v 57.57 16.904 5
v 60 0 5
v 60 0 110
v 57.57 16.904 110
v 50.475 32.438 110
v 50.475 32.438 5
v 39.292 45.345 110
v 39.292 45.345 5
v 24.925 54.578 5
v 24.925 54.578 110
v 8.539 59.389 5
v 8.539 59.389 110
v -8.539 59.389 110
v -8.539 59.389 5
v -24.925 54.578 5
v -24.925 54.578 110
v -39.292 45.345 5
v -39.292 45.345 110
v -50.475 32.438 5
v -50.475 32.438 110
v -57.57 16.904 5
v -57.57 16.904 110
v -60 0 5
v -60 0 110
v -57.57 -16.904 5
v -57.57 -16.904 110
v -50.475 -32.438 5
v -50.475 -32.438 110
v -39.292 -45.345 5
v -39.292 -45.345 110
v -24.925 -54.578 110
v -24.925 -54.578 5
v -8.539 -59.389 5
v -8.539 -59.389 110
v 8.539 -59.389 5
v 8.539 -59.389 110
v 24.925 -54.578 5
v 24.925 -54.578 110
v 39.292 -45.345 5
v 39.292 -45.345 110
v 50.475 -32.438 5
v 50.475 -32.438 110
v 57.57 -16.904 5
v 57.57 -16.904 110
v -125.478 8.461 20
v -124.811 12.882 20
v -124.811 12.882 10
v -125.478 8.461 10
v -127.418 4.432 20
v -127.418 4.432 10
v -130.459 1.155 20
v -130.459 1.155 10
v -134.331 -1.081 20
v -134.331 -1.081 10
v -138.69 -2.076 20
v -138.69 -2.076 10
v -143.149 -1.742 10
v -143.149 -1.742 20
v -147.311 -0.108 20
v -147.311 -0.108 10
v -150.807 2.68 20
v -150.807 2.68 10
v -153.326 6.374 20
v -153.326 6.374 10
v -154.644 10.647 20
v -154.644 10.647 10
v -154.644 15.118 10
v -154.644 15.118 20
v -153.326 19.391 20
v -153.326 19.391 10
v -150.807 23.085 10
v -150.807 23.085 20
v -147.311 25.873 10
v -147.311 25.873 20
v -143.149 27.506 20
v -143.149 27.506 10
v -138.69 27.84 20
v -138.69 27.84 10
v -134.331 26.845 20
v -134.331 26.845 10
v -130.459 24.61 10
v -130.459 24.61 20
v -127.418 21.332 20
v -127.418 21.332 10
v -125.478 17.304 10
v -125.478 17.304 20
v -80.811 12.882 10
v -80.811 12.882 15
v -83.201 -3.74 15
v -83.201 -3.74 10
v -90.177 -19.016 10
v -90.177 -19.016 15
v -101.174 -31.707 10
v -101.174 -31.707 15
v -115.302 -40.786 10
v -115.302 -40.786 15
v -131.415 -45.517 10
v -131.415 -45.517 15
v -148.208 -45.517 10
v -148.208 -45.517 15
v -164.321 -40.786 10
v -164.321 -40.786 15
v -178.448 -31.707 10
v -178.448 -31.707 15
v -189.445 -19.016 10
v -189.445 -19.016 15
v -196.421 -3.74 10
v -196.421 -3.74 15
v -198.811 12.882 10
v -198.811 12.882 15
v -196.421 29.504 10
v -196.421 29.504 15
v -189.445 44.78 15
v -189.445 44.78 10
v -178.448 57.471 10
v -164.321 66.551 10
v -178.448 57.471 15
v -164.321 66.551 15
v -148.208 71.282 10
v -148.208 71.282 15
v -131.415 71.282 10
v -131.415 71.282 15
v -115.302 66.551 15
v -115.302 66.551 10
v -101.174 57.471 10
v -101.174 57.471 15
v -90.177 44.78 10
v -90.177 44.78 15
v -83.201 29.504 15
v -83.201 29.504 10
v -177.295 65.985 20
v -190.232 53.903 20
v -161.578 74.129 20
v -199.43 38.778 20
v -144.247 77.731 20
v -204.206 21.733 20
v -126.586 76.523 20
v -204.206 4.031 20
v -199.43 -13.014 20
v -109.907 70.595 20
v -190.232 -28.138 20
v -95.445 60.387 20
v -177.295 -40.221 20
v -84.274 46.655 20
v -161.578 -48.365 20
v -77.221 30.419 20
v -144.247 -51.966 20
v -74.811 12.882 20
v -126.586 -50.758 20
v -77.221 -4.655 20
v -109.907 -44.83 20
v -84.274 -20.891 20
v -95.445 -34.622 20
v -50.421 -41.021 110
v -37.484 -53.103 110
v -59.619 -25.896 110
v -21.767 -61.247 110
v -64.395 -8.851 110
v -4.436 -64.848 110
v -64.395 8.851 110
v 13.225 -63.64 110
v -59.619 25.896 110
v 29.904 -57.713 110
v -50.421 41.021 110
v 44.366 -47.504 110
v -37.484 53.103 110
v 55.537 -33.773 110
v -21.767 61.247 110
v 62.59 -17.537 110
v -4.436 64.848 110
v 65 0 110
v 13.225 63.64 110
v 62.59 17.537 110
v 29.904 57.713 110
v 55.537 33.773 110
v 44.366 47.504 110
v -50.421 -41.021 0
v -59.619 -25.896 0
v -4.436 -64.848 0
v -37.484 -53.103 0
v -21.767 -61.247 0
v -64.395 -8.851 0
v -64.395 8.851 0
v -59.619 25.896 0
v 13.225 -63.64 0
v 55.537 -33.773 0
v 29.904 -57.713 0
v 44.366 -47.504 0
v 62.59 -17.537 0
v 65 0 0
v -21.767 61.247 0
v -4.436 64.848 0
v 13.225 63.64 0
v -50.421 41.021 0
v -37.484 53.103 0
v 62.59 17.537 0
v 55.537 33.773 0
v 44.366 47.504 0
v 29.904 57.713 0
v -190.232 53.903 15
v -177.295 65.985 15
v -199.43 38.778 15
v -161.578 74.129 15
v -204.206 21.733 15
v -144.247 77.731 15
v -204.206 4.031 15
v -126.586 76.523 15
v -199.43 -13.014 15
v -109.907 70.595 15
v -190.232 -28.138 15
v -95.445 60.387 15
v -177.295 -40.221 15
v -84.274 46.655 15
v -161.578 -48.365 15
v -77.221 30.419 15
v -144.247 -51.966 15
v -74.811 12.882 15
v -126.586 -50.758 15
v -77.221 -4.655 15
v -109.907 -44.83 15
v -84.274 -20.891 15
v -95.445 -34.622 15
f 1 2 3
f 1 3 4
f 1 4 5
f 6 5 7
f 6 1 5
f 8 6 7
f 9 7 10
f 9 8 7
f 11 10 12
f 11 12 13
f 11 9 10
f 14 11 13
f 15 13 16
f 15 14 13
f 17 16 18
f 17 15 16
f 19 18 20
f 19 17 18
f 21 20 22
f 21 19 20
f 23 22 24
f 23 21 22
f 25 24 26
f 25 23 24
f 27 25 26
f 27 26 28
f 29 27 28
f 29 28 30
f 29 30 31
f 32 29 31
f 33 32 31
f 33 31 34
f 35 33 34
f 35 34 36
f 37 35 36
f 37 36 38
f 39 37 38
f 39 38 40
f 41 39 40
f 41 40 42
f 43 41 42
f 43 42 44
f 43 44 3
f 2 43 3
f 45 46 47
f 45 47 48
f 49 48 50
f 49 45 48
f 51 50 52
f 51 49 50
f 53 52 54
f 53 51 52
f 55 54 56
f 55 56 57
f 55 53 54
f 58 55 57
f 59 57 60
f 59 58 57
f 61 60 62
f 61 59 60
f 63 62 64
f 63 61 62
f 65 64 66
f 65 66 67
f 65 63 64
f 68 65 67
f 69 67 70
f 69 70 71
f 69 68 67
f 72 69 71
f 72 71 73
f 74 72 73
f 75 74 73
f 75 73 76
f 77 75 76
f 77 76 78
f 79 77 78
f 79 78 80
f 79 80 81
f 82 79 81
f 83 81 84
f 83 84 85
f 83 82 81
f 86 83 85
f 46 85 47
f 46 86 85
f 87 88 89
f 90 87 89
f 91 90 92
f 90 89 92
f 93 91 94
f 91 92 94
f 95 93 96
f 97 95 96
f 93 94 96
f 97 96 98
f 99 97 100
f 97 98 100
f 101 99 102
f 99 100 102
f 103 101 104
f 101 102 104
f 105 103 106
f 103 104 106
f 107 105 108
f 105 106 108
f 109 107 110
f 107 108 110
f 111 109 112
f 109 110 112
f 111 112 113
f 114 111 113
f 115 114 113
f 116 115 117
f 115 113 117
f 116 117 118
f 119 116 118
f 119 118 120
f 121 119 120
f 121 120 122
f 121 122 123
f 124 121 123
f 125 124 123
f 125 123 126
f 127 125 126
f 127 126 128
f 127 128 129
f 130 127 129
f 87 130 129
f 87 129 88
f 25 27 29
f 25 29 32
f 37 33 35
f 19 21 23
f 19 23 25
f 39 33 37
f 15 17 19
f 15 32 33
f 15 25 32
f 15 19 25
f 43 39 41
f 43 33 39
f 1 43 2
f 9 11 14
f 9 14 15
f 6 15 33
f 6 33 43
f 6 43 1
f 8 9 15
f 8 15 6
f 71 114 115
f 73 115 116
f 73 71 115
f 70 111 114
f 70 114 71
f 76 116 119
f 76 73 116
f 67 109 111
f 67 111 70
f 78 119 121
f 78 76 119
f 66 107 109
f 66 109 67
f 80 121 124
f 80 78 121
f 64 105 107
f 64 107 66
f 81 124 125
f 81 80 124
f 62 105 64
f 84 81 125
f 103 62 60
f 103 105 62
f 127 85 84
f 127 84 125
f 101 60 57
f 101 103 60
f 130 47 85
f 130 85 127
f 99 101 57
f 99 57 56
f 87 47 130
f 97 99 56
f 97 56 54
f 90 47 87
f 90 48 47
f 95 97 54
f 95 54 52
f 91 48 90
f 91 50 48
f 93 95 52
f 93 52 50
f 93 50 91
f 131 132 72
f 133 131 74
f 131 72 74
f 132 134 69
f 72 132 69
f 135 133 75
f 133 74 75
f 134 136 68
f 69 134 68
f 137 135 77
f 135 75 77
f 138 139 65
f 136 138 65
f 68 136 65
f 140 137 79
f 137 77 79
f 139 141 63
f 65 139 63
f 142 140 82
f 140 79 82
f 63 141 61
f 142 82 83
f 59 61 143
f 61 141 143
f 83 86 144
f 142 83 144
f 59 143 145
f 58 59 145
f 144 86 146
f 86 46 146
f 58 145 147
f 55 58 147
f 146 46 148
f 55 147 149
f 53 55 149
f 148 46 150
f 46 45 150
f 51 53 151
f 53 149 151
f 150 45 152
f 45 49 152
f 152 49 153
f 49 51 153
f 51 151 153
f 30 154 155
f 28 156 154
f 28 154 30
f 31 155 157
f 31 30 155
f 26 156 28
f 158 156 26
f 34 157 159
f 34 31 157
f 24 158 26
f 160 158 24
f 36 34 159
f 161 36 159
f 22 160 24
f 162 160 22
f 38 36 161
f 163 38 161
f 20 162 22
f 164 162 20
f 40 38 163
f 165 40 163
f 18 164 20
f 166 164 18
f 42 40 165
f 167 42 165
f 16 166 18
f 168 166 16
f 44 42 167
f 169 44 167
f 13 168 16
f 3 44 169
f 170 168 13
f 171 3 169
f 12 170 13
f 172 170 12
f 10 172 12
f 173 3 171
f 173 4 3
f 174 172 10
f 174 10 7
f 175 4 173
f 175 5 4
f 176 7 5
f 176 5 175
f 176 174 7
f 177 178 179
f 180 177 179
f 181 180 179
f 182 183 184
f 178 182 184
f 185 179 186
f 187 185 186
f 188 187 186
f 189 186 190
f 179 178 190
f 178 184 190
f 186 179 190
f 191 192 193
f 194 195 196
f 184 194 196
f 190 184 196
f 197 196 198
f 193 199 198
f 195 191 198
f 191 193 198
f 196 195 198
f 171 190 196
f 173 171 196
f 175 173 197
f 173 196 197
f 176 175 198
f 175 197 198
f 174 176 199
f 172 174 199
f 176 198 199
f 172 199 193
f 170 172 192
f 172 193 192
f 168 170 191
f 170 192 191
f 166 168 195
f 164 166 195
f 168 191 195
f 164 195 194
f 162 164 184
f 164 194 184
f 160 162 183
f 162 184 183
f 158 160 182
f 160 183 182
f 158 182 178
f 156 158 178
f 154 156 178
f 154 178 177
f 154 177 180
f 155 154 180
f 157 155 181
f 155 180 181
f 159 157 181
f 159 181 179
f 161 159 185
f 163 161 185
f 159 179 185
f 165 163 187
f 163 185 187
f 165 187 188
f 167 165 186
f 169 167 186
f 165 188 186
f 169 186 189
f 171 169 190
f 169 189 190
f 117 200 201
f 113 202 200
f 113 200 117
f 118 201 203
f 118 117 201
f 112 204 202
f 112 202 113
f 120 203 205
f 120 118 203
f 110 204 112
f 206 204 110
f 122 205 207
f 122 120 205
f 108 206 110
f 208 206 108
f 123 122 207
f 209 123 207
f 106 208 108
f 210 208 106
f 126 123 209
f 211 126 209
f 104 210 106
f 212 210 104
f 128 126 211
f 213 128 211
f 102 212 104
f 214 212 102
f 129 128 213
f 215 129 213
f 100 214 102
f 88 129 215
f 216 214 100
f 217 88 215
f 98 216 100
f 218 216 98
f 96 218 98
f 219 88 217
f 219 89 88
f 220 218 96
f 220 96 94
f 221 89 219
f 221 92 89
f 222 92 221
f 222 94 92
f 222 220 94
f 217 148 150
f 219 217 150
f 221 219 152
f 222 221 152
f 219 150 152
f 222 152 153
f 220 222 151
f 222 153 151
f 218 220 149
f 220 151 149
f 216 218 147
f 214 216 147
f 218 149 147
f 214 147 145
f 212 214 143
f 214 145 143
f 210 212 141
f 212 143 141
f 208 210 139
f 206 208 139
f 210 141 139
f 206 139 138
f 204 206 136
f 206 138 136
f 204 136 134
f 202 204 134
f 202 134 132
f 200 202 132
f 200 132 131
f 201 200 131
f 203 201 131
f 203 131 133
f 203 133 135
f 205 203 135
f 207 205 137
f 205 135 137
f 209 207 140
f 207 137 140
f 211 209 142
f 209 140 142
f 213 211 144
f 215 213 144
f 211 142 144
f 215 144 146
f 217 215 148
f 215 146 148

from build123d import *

# Parameters (mm, degrees)
F0_R     = 60
F1_DEPTH = 5
F0_R_2   = 65
F2_DEPTH = 110
F3_R     = 59
F3_R_2   = 15
F4_DEPTH = 10
F3_R_3   = 65
F5_DEPTH = 5
F7_ANGLE = 180


with BuildPart() as f1:
    # F0 (on Top) → F1 (new body)
    with BuildSketch(Plane.XY):
        Circle(F0_R)
    extrude(amount=F1_DEPTH)

    # F0 (on Top) → F2 (join)
    with BuildSketch(Plane.XY):
        Circle(F0_R_2)
        Circle(F0_R, mode=Mode.SUBTRACT)
    extrude(amount=F2_DEPTH)


with BuildPart() as f4:
    # F3 (on Top) → F4 (new body)
    with BuildSketch(Plane.XY):
        with Locations((-139.811113, 12.882268)):
            Circle(F3_R)
        with Locations((-139.811113, 12.882268)):
            Circle(F3_R_2, mode=Mode.SUBTRACT)
    extrude(amount=F4_DEPTH)

    # F3 (on Top) → F5 (join)
    with BuildSketch(Plane.XY):
        with Locations((-139.811113, 12.882268)):
            Circle(F3_R_3)
        with Locations((-139.811113, 12.882268)):
            Circle(F3_R, mode=Mode.SUBTRACT)
    extrude(amount=F5_DEPTH)


with BuildPart() as f4_1:
    # F7: moved
    add(f4.part.rotate(Axis((-178.227551, 12.882268, 10), (-1, 0, 0)), F7_ANGLE))


solid = Compound([f1.part, f4_1.part])
